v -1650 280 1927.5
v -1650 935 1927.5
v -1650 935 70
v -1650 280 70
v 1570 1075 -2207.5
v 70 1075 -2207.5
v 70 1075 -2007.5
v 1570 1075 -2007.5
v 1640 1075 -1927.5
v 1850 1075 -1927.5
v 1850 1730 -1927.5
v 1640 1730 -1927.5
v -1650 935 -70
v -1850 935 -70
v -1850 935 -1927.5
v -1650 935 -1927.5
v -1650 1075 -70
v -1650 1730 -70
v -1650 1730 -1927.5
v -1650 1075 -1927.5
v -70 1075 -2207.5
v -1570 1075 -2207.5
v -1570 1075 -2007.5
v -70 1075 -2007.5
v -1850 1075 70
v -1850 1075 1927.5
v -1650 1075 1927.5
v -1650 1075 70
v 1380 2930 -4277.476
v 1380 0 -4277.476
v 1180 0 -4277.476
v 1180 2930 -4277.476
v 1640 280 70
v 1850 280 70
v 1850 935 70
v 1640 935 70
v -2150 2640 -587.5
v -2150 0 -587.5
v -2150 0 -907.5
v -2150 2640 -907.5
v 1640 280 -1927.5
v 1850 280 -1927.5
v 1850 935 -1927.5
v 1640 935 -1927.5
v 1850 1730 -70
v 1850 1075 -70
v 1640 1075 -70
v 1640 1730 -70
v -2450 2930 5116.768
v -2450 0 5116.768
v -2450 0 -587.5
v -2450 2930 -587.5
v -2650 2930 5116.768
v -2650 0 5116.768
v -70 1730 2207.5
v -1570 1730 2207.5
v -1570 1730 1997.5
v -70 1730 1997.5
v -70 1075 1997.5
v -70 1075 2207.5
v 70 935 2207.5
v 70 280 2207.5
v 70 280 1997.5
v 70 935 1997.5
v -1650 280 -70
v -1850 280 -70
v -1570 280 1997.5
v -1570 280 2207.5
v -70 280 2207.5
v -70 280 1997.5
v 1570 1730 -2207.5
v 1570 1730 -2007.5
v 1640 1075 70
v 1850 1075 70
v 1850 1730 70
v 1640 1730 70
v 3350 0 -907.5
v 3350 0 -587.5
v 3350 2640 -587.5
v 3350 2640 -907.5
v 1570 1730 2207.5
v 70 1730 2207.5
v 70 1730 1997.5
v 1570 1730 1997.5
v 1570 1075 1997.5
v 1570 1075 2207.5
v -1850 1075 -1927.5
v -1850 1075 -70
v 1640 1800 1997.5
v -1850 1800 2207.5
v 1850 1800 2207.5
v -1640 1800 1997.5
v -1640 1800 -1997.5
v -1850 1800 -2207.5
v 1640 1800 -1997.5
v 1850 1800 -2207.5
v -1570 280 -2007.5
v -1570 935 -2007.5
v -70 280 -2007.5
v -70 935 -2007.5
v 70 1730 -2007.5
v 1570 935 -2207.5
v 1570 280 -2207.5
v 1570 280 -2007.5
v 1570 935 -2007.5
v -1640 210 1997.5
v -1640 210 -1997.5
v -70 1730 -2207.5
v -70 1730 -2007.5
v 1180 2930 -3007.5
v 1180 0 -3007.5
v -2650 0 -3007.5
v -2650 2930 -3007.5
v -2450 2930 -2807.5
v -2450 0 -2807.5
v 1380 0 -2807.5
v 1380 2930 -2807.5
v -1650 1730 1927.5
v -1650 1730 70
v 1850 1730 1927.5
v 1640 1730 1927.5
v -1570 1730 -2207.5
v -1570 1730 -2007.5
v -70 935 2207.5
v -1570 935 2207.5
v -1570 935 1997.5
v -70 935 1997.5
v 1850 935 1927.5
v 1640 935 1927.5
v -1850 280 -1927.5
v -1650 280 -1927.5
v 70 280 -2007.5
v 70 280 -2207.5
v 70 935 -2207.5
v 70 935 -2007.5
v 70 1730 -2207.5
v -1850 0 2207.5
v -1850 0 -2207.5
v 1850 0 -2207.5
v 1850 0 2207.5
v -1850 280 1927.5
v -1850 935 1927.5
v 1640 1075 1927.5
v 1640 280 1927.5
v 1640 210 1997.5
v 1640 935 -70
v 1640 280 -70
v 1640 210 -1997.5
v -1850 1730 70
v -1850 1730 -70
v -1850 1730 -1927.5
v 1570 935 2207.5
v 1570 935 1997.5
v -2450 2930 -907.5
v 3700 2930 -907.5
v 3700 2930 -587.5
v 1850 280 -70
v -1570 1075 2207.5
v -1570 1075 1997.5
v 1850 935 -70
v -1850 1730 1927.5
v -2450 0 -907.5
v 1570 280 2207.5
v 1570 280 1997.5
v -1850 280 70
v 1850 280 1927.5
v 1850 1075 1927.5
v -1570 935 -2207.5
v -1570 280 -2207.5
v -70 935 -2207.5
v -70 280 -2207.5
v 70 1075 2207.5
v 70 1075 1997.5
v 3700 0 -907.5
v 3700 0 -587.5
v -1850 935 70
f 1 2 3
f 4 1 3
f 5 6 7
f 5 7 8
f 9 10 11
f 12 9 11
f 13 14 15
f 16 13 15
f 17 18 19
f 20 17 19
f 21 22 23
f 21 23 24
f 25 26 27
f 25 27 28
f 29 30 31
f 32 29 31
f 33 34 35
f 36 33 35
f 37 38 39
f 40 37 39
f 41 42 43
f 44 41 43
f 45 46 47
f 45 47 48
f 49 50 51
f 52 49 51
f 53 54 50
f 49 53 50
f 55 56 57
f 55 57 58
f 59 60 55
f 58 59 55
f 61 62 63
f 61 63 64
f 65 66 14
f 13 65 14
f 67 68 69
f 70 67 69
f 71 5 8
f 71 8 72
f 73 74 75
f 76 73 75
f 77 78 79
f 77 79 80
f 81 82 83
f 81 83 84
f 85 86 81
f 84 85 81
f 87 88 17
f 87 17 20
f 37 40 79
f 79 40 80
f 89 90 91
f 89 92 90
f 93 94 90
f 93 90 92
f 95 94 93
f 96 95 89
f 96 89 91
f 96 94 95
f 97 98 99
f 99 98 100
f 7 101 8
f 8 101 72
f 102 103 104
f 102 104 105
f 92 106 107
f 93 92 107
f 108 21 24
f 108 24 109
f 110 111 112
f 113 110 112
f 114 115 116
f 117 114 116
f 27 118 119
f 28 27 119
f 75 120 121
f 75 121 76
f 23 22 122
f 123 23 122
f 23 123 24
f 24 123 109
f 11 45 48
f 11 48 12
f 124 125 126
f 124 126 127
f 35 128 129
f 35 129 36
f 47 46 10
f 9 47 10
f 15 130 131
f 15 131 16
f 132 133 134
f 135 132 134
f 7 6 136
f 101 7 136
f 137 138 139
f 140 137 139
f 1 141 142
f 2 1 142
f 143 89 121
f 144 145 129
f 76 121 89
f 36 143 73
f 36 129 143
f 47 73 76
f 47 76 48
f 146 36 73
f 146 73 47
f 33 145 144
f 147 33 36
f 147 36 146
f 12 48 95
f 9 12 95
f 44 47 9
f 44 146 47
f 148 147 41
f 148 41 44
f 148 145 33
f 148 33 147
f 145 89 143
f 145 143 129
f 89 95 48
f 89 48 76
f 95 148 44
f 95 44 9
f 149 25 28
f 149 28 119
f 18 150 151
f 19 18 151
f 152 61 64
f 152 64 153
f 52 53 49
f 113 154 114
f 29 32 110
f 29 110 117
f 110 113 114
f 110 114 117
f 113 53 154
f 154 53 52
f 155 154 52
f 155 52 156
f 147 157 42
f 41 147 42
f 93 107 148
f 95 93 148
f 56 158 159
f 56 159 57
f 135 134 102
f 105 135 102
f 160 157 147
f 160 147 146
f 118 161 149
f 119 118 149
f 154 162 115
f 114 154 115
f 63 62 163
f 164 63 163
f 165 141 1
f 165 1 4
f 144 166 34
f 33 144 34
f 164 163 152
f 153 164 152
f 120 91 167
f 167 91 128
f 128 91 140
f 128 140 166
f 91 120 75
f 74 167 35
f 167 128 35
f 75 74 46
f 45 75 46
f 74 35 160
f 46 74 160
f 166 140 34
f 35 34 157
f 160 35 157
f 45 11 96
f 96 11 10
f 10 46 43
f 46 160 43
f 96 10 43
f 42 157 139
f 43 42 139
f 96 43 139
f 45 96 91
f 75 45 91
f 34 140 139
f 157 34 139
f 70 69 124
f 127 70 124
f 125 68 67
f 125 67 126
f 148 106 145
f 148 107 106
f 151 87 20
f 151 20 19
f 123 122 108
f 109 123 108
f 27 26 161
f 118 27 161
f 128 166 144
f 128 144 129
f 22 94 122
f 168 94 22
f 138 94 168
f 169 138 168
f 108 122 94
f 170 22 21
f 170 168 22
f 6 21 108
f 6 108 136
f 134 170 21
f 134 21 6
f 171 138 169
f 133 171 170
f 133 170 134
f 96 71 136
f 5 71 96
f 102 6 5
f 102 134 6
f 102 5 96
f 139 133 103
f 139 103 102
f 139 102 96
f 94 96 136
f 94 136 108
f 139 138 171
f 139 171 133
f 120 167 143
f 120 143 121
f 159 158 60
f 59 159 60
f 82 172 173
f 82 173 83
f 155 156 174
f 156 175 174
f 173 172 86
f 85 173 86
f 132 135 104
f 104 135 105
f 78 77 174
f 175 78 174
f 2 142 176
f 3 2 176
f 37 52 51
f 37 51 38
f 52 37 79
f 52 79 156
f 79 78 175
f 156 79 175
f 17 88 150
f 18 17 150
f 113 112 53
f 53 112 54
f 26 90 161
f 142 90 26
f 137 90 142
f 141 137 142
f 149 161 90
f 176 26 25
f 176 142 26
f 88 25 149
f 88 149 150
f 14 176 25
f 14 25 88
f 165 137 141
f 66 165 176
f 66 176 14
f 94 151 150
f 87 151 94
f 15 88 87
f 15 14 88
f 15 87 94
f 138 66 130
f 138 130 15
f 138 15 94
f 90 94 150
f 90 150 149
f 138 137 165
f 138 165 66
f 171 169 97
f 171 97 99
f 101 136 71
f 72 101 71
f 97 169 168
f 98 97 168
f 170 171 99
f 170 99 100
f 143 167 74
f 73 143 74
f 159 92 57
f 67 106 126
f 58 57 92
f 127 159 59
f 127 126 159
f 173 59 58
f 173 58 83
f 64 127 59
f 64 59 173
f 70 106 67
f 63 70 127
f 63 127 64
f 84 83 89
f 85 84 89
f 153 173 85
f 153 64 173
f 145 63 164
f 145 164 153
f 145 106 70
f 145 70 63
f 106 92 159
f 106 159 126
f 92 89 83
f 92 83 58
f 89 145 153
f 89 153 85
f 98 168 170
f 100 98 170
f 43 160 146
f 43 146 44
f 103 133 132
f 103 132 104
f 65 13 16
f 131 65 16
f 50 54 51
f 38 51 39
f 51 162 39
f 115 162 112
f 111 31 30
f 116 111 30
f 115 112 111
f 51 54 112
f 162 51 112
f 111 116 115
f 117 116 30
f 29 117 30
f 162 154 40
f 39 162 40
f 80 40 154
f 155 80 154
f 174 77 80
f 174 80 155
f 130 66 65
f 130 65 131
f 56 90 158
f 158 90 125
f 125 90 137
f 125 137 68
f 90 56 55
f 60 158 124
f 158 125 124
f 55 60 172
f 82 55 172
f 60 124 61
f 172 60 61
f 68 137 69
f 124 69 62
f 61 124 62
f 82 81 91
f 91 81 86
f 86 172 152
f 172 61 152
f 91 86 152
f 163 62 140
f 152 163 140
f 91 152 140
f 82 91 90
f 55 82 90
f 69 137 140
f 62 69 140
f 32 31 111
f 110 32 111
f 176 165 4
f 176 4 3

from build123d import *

# Parameters (mm, degrees)
SKETCH1_W             = 3700
SKETCH1_H             = 4415
SKETCH1_W_2           = 3280
SKETCH1_H_2           = 3995
BOSS_EXTRUDE1_DEPTH   = 210
SKETCH1_3_W           = 3700
SKETCH1_3_H           = 4415
SKETCH1_3_W_2         = 3280
SKETCH1_3_H_2         = 3995
BOSS_EXTRUDE2_DEPTH   = 1800
CUT_EXTRUDE1_REACH    = 5116.169
SKETCH2_W             = 1500
SKETCH2_H             = 655
CUT_EXTRUDE2_START    = -4415
SKETCH2_3_W           = 1500
SKETCH2_3_H           = 655
CUT_EXTRUDE2_DEPTH    = 200
CUT_EXTRUDE3_REACH    = 4671.374
SKETCH3_W             = 1857.5
SKETCH3_H             = 655
CUT_EXTRUDE4_START    = -3700
SKETCH3_3_W           = 1857.5
SKETCH3_3_H           = 655
CUT_EXTRUDE4_DEPTH    = 200
SKETCH4_W             = 350
SKETCH4_H             = 320
BOSS_EXTRUDE3_DEPTH   = 2640
SKETCH4_W_2           = 300
BOSS_EXTRUDE3_2_DEPTH = 2640
SKETCH5_W             = 6150
SKETCH5_H             = 320
BOSS_EXTRUDE4_DEPTH   = 290
BOSS_EXTRUDE5_DEPTH   = 2930


with BuildPart() as part:
    # Sketch1 → Boss-Extrude1 (new body)
    with BuildSketch(Plane(origin=(0, 0, 0), x_dir=(1, 0, 0), z_dir=(0, 1, 0))):
        Rectangle(SKETCH1_W, SKETCH1_H)
        Rectangle(SKETCH1_W_2, SKETCH1_H_2, mode=Mode.SUBTRACT)
        Rectangle(SKETCH1_W_2, SKETCH1_H_2)
    extrude(amount=BOSS_EXTRUDE1_DEPTH)

    # Sketch1<3> → Boss-Extrude2 (add)
    with BuildSketch(Plane(origin=(0, 0, 0), x_dir=(1, 0, 0), z_dir=(0, 1, 0))):
        Rectangle(SKETCH1_3_W, SKETCH1_3_H)
        Rectangle(SKETCH1_3_W_2, SKETCH1_3_H_2, mode=Mode.SUBTRACT)
    extrude(amount=BOSS_EXTRUDE2_DEPTH)

    # Sketch2 → Cut-Extrude1 (cut, up to next)
    with BuildSketch(Plane.XY.offset(2207.5), mode=Mode.PRIVATE) as cut_extrude1_sk1:
        with Locations((-820, 1402.5)):
            Rectangle(SKETCH2_W, SKETCH2_H)
    cut_extrude1_tool1 = extrude(cut_extrude1_sk1.sketch, amount=-CUT_EXTRUDE1_REACH, mode=Mode.PRIVATE) & part.part
    # Sketch2 → Cut-Extrude1 (cut, up to next)
    with BuildSketch(Plane.XY.offset(2207.5), mode=Mode.PRIVATE) as cut_extrude1_sk2:
        with Locations((-820, 607.5)):
            Rectangle(SKETCH2_W, SKETCH2_H)
    cut_extrude1_tool2 = extrude(cut_extrude1_sk2.sketch, amount=-CUT_EXTRUDE1_REACH, mode=Mode.PRIVATE) & part.part
    # Sketch2 → Cut-Extrude1 (cut, up to next)
    with BuildSketch(Plane.XY.offset(2207.5), mode=Mode.PRIVATE) as cut_extrude1_sk3:
        with Locations((820, 607.5)):
            Rectangle(SKETCH2_W, SKETCH2_H)
    cut_extrude1_tool3 = extrude(cut_extrude1_sk3.sketch, amount=-CUT_EXTRUDE1_REACH, mode=Mode.PRIVATE) & part.part
    # Sketch2 → Cut-Extrude1 (cut, up to next)
    with BuildSketch(Plane.XY.offset(2207.5), mode=Mode.PRIVATE) as cut_extrude1_sk4:
        with Locations((820, 1402.5)):
            Rectangle(SKETCH2_W, SKETCH2_H)
    cut_extrude1_tool4 = extrude(cut_extrude1_sk4.sketch, amount=-CUT_EXTRUDE1_REACH, mode=Mode.PRIVATE) & part.part
    add(cut_extrude1_tool1.solids().sort_by_distance((-820, 1402.5, 2207.5))[0], mode=Mode.SUBTRACT)
    add(cut_extrude1_tool2.solids().sort_by_distance((-820, 607.5, 2207.5))[0], mode=Mode.SUBTRACT)
    add(cut_extrude1_tool3.solids().sort_by_distance((820, 607.5, 2207.5))[0], mode=Mode.SUBTRACT)
    add(cut_extrude1_tool4.solids().sort_by_distance((820, 1402.5, 2207.5))[0], mode=Mode.SUBTRACT)

    # Sketch2<3> → Cut-Extrude2 (cut)
    with BuildSketch(Plane.XY.offset(2207.5).offset(CUT_EXTRUDE2_START)):
        with Locations((820, 1402.5)):
            Rectangle(SKETCH2_3_W, SKETCH2_3_H)
        with Locations((-820, 1402.5)):
            Rectangle(SKETCH2_3_W, SKETCH2_3_H)
        with Locations((-820, 607.5)):
            Rectangle(SKETCH2_3_W, SKETCH2_3_H)
        with Locations((820, 607.5)):
            Rectangle(SKETCH2_3_W, SKETCH2_3_H)
    extrude(amount=CUT_EXTRUDE2_DEPTH, mode=Mode.SUBTRACT)

    # Sketch3 → Cut-Extrude3 (cut, up to next)
    with BuildSketch(Plane(origin=(1850, 0, 0), x_dir=(0, 0, -1), z_dir=(1, 0, 0)), mode=Mode.PRIVATE) as cut_extrude3_sk1:
        with Locations((-998.75, 1402.5)):
            Rectangle(SKETCH3_W, SKETCH3_H)
    cut_extrude3_tool1 = extrude(cut_extrude3_sk1.sketch, amount=-CUT_EXTRUDE3_REACH, mode=Mode.PRIVATE) & part.part
    # Sketch3 → Cut-Extrude3 (cut, up to next)
    with BuildSketch(Plane(origin=(1850, 0, 0), x_dir=(0, 0, -1), z_dir=(1, 0, 0)), mode=Mode.PRIVATE) as cut_extrude3_sk2:
        with Locations((-998.75, 607.5)):
            Rectangle(SKETCH3_W, SKETCH3_H)
    cut_extrude3_tool2 = extrude(cut_extrude3_sk2.sketch, amount=-CUT_EXTRUDE3_REACH, mode=Mode.PRIVATE) & part.part
    # Sketch3 → Cut-Extrude3 (cut, up to next)
    with BuildSketch(Plane(origin=(1850, 0, 0), x_dir=(0, 0, -1), z_dir=(1, 0, 0)), mode=Mode.PRIVATE) as cut_extrude3_sk3:
        with Locations((998.75, 607.5)):
            Rectangle(SKETCH3_W, SKETCH3_H)
    cut_extrude3_tool3 = extrude(cut_extrude3_sk3.sketch, amount=-CUT_EXTRUDE3_REACH, mode=Mode.PRIVATE) & part.part
    # Sketch3 → Cut-Extrude3 (cut, up to next)
    with BuildSketch(Plane(origin=(1850, 0, 0), x_dir=(0, 0, -1), z_dir=(1, 0, 0)), mode=Mode.PRIVATE) as cut_extrude3_sk4:
        with Locations((998.75, 1402.5)):
            Rectangle(SKETCH3_W, SKETCH3_H)
    cut_extrude3_tool4 = extrude(cut_extrude3_sk4.sketch, amount=-CUT_EXTRUDE3_REACH, mode=Mode.PRIVATE) & part.part
    add(cut_extrude3_tool1.solids().sort_by_distance((1850, 1402.5, 998.75))[0], mode=Mode.SUBTRACT)
    add(cut_extrude3_tool2.solids().sort_by_distance((1850, 607.5, 998.75))[0], mode=Mode.SUBTRACT)
    add(cut_extrude3_tool3.solids().sort_by_distance((1850, 607.5, -998.75))[0], mode=Mode.SUBTRACT)
    add(cut_extrude3_tool4.solids().sort_by_distance((1850, 1402.5, -998.75))[0], mode=Mode.SUBTRACT)

    # Sketch3<3> → Cut-Extrude4 (cut)
    with BuildSketch(Plane(origin=(1850, 0, 0), x_dir=(0, 0, -1), z_dir=(1, 0, 0)).offset(CUT_EXTRUDE4_START)):
        with Locations((998.75, 607.5)):
            Rectangle(SKETCH3_3_W, SKETCH3_3_H)
        with Locations((998.75, 1402.5)):
            Rectangle(SKETCH3_3_W, SKETCH3_3_H)
        with Locations((-998.75, 1402.5)):
            Rectangle(SKETCH3_3_W, SKETCH3_3_H)
        with Locations((-998.75, 607.5)):
            Rectangle(SKETCH3_3_W, SKETCH3_3_H)
    extrude(amount=CUT_EXTRUDE4_DEPTH, mode=Mode.SUBTRACT)


with BuildPart() as body_2:
    # Sketch4 → Boss-Extrude3 (new body)
    with BuildSketch(Plane(origin=(0, 0, 0), x_dir=(1, 0, 0), z_dir=(0, 1, 0))):
        with Locations((3525, 747.5)):
            Rectangle(SKETCH4_W, SKETCH4_H)
    extrude(amount=BOSS_EXTRUDE3_DEPTH)



with BuildPart() as body_3:
    # Sketch4 → Boss-Extrude3 2 (new body)
    with BuildSketch(Plane(origin=(0, 0, 0), x_dir=(1, 0, 0), z_dir=(0, 1, 0))):
        with Locations((-2300, 747.5)):
            Rectangle(SKETCH4_W_2, SKETCH4_H)
    extrude(amount=BOSS_EXTRUDE3_2_DEPTH)


with BuildPart() as body_2_1:
    add(body_2.part)

    add(body_3.part)  # Boss-Extrude4 merges body 3
    # Sketch5 → Boss-Extrude4 (add)
    with BuildSketch(Plane(origin=(0, 2640, 0), x_dir=(1, 0, 0), z_dir=(0, 1, 0))):
        with Locations((625, 747.5)):
            Rectangle(SKETCH5_W, SKETCH5_H)
    extrude(amount=BOSS_EXTRUDE4_DEPTH)

    # Sketch4<3> → Boss-Extrude5 (add)
    with BuildSketch(Plane(origin=(0, 0, 0), x_dir=(1, 0, 0), z_dir=(0, 1, 0))):
        Polygon((1180, 4277.475628021), (1180, 3007.5), (-2650, 3007.5), (-2650, -5116.768477228), (-2450, -5116.768477228), (-2450, 587.5), (-2450, 907.5), (-2450, 2807.5), (1380, 2807.5), (1380, 4277.475628021), align=None)
    extrude(amount=BOSS_EXTRUDE5_DEPTH)


solid = Compound([part.part, body_2_1.part])
